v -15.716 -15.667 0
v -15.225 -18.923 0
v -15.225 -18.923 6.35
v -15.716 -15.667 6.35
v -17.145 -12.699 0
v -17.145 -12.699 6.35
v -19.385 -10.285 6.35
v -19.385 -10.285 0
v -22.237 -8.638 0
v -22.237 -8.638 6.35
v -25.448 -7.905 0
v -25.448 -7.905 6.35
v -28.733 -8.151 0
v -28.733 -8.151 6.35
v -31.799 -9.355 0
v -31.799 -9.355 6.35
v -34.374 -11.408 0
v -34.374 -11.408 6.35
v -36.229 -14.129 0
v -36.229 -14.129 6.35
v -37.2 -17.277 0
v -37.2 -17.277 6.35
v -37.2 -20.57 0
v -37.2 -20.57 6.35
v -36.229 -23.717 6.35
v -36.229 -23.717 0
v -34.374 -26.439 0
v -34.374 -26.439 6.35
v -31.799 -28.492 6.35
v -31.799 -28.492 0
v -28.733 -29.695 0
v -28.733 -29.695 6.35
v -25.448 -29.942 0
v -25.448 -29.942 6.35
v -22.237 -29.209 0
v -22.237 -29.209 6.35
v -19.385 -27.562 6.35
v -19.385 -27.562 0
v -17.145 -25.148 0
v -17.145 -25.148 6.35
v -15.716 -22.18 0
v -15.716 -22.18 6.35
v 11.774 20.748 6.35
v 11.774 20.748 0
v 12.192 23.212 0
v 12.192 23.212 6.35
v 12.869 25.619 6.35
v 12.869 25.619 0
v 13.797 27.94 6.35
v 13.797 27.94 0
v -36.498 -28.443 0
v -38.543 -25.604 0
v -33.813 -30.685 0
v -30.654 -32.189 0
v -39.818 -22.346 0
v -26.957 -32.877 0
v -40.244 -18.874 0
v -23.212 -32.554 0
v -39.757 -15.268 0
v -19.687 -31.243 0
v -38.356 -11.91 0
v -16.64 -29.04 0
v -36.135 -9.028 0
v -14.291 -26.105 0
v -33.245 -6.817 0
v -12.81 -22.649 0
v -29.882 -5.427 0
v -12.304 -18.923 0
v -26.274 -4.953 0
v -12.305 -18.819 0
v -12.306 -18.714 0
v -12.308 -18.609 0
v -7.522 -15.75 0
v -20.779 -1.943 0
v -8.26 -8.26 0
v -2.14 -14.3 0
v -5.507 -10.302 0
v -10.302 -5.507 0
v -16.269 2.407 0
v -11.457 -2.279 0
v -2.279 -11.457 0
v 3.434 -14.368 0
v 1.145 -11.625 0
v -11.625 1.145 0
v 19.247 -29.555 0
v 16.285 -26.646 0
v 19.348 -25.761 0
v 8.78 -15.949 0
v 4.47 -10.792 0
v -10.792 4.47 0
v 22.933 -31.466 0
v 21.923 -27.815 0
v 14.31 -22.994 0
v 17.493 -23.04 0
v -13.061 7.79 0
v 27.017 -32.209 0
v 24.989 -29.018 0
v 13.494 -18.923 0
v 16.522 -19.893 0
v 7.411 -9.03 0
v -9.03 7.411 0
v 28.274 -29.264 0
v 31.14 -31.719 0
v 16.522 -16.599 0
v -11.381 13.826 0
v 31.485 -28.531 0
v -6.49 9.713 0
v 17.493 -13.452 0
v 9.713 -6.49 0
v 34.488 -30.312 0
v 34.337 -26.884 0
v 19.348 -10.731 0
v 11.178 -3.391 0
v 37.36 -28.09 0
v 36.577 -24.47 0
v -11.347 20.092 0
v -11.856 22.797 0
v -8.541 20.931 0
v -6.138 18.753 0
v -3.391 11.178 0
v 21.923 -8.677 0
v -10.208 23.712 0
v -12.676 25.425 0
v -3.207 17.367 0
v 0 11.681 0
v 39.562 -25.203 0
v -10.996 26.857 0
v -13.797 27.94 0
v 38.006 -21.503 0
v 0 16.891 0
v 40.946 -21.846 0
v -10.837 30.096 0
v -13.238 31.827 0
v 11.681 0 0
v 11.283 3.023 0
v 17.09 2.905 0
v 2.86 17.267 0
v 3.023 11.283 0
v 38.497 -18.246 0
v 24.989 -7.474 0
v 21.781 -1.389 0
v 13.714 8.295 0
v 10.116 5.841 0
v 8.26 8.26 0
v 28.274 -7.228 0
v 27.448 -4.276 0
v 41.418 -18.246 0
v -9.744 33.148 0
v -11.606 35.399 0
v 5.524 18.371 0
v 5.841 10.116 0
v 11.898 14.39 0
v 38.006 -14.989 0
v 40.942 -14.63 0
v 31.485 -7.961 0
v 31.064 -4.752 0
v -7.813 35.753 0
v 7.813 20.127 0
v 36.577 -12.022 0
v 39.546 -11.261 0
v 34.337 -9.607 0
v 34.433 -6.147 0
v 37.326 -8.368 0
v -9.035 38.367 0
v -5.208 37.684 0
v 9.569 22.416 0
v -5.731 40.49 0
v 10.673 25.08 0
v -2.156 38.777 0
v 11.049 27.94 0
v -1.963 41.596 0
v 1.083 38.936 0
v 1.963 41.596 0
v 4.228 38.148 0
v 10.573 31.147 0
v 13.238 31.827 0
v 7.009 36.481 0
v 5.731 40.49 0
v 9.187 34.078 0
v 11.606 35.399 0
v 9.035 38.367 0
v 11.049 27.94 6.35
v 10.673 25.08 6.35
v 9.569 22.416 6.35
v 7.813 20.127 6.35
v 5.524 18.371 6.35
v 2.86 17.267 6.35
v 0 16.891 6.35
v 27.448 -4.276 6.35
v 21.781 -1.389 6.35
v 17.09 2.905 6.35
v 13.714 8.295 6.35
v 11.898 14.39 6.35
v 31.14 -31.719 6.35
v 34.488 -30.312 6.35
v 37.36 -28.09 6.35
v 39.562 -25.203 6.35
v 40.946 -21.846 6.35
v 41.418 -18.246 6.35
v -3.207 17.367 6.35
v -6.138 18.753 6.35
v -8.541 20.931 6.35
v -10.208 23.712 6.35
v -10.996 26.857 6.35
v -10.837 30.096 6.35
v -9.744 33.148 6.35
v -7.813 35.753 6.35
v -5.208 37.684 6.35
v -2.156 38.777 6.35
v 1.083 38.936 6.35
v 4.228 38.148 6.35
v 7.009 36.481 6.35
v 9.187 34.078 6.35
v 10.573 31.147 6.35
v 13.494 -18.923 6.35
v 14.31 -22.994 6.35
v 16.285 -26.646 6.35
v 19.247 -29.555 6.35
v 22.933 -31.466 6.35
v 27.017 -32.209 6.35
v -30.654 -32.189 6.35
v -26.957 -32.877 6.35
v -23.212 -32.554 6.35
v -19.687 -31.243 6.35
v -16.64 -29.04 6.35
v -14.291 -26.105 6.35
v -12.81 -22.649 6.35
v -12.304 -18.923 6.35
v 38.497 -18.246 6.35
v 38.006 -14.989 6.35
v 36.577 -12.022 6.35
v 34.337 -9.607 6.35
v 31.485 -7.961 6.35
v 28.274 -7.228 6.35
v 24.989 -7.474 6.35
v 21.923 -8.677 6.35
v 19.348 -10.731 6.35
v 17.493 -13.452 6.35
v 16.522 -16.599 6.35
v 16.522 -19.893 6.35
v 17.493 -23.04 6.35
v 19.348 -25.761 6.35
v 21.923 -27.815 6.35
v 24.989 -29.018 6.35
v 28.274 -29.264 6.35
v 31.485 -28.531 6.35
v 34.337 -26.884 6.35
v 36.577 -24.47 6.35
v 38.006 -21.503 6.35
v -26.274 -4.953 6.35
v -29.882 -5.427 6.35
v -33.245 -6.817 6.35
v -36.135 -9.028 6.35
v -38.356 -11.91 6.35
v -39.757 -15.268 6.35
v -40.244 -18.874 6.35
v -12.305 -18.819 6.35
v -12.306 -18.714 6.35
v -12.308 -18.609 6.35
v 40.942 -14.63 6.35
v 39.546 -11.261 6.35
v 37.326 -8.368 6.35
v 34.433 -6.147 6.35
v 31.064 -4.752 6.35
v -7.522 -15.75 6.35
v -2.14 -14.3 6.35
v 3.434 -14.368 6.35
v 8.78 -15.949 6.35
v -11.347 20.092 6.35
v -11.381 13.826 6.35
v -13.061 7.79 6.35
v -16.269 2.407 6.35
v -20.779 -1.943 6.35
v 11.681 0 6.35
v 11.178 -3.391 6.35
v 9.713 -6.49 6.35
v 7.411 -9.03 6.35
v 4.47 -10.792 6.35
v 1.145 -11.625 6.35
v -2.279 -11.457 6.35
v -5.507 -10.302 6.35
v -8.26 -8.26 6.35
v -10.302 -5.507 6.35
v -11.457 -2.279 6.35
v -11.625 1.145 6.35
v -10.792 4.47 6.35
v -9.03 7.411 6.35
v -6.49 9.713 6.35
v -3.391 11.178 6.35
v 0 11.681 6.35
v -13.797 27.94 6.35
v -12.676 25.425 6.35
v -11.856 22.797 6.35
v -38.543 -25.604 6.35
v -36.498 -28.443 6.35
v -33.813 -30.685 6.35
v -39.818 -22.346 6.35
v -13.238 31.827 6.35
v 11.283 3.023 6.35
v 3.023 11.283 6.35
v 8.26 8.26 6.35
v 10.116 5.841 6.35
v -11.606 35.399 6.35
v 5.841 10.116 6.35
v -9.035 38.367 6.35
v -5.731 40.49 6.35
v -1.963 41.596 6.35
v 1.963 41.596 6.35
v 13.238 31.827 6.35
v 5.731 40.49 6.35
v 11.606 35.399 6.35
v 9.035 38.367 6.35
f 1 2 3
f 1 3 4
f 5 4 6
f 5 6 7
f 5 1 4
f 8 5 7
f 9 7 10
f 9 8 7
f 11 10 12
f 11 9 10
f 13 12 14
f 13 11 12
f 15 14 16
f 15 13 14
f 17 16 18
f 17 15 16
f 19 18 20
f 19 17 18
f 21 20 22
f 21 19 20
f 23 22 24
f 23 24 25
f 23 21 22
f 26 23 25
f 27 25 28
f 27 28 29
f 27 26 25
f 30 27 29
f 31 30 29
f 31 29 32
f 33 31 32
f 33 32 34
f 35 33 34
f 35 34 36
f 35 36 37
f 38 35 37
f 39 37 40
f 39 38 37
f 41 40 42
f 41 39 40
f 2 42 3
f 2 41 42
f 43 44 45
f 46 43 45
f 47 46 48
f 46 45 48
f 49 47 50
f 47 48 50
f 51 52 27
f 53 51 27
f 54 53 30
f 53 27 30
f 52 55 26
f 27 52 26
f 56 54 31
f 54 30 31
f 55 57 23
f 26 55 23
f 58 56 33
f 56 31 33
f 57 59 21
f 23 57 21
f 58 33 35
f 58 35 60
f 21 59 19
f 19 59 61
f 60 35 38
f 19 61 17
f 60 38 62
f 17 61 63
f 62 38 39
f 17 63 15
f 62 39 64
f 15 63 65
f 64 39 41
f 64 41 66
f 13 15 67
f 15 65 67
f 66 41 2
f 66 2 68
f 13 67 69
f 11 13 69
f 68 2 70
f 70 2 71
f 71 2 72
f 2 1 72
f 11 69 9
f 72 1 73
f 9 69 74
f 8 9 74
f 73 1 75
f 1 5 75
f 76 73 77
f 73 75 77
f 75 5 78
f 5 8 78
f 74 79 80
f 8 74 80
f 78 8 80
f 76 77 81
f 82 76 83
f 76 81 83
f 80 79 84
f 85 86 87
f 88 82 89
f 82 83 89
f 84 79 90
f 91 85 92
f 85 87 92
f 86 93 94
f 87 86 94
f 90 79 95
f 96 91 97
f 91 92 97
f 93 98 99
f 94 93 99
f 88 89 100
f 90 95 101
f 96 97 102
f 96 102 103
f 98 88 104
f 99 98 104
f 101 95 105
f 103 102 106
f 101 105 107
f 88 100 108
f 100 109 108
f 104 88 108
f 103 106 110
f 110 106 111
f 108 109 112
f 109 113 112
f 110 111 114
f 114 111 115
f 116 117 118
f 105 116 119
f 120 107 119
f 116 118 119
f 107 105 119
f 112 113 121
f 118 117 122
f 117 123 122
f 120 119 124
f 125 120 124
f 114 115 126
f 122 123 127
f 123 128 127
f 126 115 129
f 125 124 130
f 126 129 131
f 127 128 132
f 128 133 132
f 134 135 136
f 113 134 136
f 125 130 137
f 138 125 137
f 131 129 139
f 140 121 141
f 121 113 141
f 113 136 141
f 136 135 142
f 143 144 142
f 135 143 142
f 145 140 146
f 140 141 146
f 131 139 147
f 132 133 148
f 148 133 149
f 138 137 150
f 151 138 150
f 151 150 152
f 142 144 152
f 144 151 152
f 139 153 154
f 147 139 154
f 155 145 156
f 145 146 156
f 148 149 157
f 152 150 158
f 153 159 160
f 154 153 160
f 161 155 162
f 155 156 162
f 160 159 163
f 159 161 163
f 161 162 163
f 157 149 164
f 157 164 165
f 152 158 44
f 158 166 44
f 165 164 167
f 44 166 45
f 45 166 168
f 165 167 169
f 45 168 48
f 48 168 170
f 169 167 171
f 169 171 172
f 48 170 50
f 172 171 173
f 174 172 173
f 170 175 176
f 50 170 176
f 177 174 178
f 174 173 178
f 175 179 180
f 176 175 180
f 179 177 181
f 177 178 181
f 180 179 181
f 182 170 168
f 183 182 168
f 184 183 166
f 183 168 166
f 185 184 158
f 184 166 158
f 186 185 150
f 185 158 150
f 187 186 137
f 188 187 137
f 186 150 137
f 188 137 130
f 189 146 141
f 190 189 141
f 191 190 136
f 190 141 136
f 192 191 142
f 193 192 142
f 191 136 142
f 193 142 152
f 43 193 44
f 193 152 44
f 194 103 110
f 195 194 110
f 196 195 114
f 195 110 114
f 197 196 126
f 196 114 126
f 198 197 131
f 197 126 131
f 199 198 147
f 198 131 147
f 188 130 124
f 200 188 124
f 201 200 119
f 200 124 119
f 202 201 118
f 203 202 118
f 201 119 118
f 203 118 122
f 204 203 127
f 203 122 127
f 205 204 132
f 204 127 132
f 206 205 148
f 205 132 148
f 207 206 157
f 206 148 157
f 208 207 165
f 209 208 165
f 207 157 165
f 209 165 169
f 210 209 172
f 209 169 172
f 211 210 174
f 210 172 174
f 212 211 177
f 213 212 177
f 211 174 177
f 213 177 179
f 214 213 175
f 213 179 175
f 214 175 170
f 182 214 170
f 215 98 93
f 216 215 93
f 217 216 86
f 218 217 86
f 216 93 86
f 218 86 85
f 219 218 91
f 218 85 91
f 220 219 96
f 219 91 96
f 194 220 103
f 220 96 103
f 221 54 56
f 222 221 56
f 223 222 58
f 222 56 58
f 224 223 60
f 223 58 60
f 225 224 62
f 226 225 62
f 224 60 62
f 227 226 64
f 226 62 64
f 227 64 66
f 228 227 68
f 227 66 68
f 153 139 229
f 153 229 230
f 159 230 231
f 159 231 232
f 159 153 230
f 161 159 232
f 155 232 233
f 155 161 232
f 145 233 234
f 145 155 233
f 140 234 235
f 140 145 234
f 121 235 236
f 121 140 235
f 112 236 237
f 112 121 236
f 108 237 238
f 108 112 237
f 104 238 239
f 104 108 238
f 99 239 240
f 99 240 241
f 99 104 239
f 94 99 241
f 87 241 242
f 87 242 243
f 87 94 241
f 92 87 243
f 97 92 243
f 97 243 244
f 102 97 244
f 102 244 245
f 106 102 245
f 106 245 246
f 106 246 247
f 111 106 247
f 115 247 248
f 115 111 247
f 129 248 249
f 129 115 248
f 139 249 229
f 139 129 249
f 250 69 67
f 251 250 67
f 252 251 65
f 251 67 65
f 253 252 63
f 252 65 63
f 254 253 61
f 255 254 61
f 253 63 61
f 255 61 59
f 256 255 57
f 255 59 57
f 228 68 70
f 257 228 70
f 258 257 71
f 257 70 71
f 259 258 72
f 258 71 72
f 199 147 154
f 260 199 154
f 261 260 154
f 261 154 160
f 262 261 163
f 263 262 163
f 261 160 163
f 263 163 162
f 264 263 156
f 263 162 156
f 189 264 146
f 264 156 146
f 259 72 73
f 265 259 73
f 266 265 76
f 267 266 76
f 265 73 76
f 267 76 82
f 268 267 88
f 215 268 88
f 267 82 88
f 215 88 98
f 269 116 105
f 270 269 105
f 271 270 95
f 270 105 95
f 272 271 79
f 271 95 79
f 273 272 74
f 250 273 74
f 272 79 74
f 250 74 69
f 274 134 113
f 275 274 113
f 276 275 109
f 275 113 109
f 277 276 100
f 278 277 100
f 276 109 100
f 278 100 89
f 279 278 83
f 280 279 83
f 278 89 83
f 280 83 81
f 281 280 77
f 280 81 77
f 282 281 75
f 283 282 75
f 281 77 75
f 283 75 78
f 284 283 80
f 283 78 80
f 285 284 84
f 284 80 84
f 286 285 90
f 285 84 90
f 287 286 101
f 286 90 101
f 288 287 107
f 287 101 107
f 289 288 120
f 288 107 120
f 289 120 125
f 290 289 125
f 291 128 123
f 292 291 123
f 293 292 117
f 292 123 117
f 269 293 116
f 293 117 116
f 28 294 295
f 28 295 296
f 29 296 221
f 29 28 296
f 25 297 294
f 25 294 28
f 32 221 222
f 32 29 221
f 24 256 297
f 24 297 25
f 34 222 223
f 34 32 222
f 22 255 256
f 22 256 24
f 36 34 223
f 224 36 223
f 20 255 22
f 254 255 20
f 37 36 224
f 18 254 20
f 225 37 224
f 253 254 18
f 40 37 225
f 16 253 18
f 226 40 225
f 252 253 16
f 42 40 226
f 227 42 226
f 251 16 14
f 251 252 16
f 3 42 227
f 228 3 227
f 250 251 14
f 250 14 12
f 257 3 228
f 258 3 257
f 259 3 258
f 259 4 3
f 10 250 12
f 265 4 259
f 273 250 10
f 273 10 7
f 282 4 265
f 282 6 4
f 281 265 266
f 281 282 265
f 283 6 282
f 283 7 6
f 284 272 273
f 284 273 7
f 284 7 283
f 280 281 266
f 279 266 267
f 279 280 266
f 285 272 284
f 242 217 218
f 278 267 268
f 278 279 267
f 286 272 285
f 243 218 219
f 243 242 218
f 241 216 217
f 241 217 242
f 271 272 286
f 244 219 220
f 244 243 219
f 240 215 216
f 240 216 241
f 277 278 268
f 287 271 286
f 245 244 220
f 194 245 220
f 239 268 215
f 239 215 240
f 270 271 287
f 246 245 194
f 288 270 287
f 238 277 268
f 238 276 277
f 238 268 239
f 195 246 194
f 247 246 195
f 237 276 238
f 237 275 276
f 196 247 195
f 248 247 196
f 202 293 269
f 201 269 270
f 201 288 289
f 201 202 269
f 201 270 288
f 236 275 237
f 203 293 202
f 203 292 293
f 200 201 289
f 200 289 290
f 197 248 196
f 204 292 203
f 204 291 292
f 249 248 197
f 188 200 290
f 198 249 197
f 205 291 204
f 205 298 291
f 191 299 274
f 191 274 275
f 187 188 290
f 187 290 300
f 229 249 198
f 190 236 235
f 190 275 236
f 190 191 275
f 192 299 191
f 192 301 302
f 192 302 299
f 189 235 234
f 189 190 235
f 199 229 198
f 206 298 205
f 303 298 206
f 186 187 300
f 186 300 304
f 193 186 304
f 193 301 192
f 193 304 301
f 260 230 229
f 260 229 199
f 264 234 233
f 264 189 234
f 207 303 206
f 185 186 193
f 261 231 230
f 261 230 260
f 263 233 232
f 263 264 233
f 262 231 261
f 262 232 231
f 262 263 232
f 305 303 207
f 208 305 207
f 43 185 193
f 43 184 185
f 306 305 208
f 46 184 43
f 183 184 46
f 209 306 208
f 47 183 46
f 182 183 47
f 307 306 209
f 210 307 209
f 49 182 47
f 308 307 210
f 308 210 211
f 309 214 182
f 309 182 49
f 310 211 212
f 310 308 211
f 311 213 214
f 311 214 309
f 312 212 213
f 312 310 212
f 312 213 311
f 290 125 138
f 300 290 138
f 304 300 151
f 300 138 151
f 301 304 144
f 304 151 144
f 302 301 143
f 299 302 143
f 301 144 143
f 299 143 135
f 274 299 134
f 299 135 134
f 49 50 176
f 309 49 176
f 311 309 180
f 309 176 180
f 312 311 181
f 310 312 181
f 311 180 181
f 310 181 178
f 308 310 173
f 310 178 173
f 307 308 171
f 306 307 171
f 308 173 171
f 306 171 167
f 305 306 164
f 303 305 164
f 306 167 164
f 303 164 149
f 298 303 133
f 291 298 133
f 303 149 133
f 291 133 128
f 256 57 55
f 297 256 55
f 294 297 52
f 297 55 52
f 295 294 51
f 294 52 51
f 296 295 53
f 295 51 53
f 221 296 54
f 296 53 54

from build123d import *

# Parameters (mm, degrees)
F0_R     = 11.049
F1_DEPTH = 6.35


with BuildPart() as f1:
    # F0 (on Top) → F1 (new body)
    with BuildSketch(Plane.XY):
        with BuildLine():
            ThreePointArc((-11.3469625039, 20.0920200438), (-14.4854082565, 4.9914875059), (-26.2741162088, -4.9534755149))
            ThreePointArc((-26.2741162088, -4.9534755149), (-16.5077935225, -8.934489521), (-12.3076651672, -18.6086020451))
            ThreePointArc((-12.3076651672, -18.6086020451), (0.649772882, -14.1418626943), (13.4943491716, -18.9234755149))
            ThreePointArc((13.4943491716, -18.9234755149), (17.3328597235, -8.6100846058), (27.4479022012, -4.2757898563))
            ThreePointArc((27.4479022012, -4.2757898563), (15.2201160848, 5.4859259906), (11.7737009685, 20.7480383092))
            ThreePointArc((11.7737009685, 20.7480383092), (6.7498223767, 15.9073674809), (0, 14.1434661071))
            ThreePointArc((0, 14.1434661071), (-6.4058342939, 15.720767845), (-11.3469625039, 20.0920200438))
        make_face()
        with BuildLine():
            ThreePointArc((13.97, 0), (-9.8782817332, -9.8782817332), (0, 13.97))
            ThreePointArc((0, 13.97), (9.8782817332, 9.8782817332), (13.97, 0))
        make_face(mode=Mode.SUBTRACT)
        with BuildLine():
            ThreePointArc((13.97, 0), (9.8782817332, 9.8782817332), (0, 13.97))
            ThreePointArc((0, 13.97), (-9.8782817332, -9.8782817332), (13.97, 0))
        make_face()
        with BuildLine():
            ThreePointArc((11.6814433874, 0), (-8.2600278333, -8.2600278333), (0, 11.6814433874))
            ThreePointArc((0, 11.6814433874), (8.2600278333, 8.2600278333), (11.6814433874, 0))
        make_face(mode=Mode.SUBTRACT)
        with BuildLine():
            ThreePointArc((-26.2741162088, -4.9534755149), (-36.1348230129, -9.0276500657), (-40.2440279254, -18.8738103292))
            ThreePointArc((-40.2440279254, -18.8738103292), (-36.068722537, -25.9778704776), (-30.6538718182, -32.1891696469))
            ThreePointArc((-30.6538718182, -32.1891696469), (-18.0895052181, -30.2448289204), (-12.3041162088, -18.9234755149))
            ThreePointArc((-12.3041162088, -18.9234755149), (-12.3050034765, -18.7660287802), (-12.3076651672, -18.6086020451))
            ThreePointArc((-12.3076651672, -18.6086020451), (-16.5077935225, -8.934489521), (-26.2741162088, -4.9534755149))
        make_face()
        with Locations((-26.2741162088, -18.9234755149)):
            Circle(F0_R, mode=Mode.SUBTRACT)
        with BuildLine():
            ThreePointArc((-13.7965338929, 27.94), (-12.227697713, 24.1233976847), (-11.3469625039, 20.0920200438))
            ThreePointArc((-11.3469625039, 20.0920200438), (-6.4058342939, 15.720767845), (0, 14.1434661071))
            ThreePointArc((0, 14.1434661071), (6.7498223767, 15.9073674809), (11.7737009685, 20.7480383092))
            ThreePointArc((11.7737009685, 20.7480383092), (12.4990400343, 24.4244821494), (13.7965338929, 27.94))
            ThreePointArc((13.7965338929, 27.94), (0, 41.7365338929), (-13.7965338929, 27.94))
        make_face()
        with BuildLine():
            ThreePointArc((11.049, 27.94), (7.8128228253, 20.1271771747), (0, 16.891))
            ThreePointArc((0, 16.891), (-7.8128228253, 35.7528228253), (11.049, 27.94))
        make_face(mode=Mode.SUBTRACT)
        with BuildLine():
            ThreePointArc((31.1400760327, -31.7190505009), (37.0174753812, -24.6070928067), (41.3000458498, -16.4349844175))
            ThreePointArc((41.3000458498, -16.4349844175), (36.6637566928, -7.7467934285), (27.4479022012, -4.2757898563))
            ThreePointArc((27.4479022012, -4.2757898563), (17.3328597235, -8.6100846058), (13.4943491716, -18.9234755149))
            ThreePointArc((13.4943491716, -18.9234755149), (19.2469473442, -29.5553097149), (31.1400760327, -31.7190505009))
        make_face()
        with Locations((27.4479022012, -18.2457898563)):
            Circle(F0_R, mode=Mode.SUBTRACT)
        with BuildLine():
            ThreePointArc((41.4179022012, -18.2457898563), (41.3884069763, -17.338471492), (41.3000458498, -16.4349844175))
            ThreePointArc((41.3000458498, -16.4349844175), (37.0174753812, -24.6070928067), (31.1400760327, -31.7190505009))
            ThreePointArc((31.1400760327, -31.7190505009), (38.5551198642, -26.7187241642), (41.4179022012, -18.2457898563))
        make_face()
        with BuildLine():
            ThreePointArc((-30.6538718182, -32.1891696469), (-36.068722537, -25.9778704776), (-40.2440279254, -18.8738103292))
            ThreePointArc((-40.2440279254, -18.8738103292), (-37.6100004347, -27.0879490936), (-30.6538718182, -32.1891696469))
        make_face()
    extrude(amount=F1_DEPTH)


solid = f1.part
